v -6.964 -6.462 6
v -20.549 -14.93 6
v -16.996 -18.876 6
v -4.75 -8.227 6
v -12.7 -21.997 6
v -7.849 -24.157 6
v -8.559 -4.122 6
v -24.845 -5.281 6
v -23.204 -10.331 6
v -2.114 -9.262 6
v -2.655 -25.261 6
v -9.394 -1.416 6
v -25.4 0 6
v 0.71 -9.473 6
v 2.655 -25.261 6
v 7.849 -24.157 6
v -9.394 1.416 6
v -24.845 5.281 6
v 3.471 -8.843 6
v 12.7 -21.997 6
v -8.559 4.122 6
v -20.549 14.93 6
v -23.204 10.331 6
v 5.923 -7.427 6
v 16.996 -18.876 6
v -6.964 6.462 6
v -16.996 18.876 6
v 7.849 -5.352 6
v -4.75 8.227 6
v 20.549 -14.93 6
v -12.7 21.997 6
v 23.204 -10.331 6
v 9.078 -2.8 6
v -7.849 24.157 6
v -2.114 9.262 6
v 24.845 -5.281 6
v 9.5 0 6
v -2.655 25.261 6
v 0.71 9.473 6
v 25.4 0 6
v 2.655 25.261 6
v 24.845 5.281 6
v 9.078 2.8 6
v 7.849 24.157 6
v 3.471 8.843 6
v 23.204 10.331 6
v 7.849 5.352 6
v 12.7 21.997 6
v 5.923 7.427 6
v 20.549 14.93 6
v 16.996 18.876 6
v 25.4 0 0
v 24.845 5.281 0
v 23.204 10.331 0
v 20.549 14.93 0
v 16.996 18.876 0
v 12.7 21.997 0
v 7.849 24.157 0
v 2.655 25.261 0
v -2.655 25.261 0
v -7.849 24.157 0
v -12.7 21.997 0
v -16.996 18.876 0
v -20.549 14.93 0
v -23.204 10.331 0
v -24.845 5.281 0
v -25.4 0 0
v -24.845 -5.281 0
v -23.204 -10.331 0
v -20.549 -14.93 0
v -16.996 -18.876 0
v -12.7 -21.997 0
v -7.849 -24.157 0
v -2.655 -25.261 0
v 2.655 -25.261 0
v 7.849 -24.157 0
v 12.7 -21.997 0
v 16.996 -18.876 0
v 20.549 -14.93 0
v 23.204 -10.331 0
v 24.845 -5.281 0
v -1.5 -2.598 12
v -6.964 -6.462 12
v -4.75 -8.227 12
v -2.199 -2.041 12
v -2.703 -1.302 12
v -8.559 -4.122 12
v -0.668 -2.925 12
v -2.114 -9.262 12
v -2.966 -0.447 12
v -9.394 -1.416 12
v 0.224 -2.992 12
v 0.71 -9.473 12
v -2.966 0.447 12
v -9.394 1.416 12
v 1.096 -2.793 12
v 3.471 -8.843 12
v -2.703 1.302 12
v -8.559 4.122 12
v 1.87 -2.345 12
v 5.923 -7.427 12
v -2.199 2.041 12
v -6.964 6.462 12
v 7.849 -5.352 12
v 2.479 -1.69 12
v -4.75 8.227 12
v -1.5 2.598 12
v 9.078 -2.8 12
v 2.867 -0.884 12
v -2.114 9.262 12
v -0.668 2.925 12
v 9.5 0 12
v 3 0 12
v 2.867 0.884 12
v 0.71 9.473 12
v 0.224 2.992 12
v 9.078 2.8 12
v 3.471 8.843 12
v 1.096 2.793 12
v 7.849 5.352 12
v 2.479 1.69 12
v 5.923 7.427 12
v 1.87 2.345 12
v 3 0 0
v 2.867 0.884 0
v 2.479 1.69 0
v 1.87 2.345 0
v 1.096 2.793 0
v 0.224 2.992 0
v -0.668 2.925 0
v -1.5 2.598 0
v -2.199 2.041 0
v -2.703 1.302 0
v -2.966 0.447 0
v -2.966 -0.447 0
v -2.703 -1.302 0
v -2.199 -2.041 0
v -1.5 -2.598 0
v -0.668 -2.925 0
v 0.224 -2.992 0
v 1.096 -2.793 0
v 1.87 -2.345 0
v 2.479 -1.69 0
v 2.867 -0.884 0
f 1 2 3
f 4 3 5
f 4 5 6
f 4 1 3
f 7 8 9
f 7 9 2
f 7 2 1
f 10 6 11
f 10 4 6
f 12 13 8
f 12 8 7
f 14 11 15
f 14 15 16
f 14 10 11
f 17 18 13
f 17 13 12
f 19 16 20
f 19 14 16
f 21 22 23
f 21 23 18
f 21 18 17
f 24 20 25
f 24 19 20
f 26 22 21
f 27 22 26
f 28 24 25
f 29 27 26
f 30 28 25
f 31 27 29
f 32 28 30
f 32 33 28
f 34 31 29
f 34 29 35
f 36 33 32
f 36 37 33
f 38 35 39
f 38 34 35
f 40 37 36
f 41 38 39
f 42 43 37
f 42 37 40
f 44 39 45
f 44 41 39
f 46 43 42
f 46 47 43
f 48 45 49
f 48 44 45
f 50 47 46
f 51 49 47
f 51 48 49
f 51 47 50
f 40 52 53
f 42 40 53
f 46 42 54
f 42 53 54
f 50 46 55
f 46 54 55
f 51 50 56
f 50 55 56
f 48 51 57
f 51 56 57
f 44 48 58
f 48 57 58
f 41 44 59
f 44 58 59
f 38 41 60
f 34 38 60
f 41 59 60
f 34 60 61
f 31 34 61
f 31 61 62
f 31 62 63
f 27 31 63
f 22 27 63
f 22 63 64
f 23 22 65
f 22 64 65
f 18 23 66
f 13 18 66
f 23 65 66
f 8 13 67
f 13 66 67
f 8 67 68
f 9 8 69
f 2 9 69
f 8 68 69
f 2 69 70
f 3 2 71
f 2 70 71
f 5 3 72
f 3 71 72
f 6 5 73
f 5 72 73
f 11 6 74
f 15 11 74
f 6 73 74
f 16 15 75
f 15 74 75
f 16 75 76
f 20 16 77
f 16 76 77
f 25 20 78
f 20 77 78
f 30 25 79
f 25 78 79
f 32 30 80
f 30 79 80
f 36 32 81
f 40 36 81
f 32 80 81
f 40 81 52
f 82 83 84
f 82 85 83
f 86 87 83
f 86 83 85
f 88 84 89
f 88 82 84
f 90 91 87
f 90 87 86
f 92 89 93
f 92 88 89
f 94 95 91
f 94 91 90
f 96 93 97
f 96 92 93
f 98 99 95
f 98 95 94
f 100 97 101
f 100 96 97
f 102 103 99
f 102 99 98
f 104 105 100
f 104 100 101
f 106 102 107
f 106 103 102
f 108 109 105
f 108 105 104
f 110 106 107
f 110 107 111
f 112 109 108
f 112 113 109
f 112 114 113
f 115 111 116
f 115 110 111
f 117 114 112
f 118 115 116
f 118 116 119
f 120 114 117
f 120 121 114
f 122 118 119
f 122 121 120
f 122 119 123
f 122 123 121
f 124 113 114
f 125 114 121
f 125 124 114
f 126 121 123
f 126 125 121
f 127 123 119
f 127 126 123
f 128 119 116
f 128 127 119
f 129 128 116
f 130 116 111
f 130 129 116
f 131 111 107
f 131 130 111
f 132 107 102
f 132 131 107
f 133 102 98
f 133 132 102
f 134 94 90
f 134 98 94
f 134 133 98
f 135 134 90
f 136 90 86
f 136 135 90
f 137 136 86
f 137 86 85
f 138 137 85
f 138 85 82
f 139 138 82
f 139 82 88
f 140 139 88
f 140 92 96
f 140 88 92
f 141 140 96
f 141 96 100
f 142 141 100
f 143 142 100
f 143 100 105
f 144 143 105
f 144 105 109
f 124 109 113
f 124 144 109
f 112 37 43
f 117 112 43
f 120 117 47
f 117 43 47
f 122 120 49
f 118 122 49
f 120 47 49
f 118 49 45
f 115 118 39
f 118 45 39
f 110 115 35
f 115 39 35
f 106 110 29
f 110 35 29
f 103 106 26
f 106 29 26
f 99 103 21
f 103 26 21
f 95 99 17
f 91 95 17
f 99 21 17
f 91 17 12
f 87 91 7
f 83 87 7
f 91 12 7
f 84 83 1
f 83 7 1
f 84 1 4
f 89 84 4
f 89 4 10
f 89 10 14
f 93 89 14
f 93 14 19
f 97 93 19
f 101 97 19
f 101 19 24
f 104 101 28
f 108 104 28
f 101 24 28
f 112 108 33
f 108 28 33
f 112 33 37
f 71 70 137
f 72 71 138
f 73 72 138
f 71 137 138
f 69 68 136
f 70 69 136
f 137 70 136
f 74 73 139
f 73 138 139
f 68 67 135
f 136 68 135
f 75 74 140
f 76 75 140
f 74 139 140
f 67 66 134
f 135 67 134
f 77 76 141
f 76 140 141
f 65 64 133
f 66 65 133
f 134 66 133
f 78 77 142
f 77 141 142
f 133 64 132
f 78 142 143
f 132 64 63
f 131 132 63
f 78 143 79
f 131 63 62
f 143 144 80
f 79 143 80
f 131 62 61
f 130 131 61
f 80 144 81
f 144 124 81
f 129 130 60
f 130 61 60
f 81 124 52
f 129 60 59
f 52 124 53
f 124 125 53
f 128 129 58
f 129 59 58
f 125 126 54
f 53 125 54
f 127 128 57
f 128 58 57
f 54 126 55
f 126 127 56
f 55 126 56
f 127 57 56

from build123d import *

# Parameters (mm, degrees)
SKETCH1_R           = 25.4
BOSS_EXTRUDE1_DEPTH = 6
SKETCH4_R           = 9.5
BOSS_EXTRUDE2_DEPTH = 6
CUT_EXTRUDE1_REACH  = 39.872
SKETCH6_R           = 3


with BuildPart() as part:
    # Sketch1 → Boss-Extrude1 (new body)
    with BuildSketch(Plane.XY):
        Circle(SKETCH1_R)
    extrude(amount=BOSS_EXTRUDE1_DEPTH)

    # Sketch4 → Boss-Extrude2 (add)
    with BuildSketch(Plane.XY.offset(6)):
        Circle(SKETCH4_R)
    extrude(amount=BOSS_EXTRUDE2_DEPTH)

    # Sketch6 → Cut-Extrude1 (cut, up to next)
    with BuildSketch(Plane.XY, mode=Mode.PRIVATE) as cut_extrude1_sk1:
        Circle(SKETCH6_R)
    cut_extrude1_tool1 = extrude(cut_extrude1_sk1.sketch, amount=CUT_EXTRUDE1_REACH, mode=Mode.PRIVATE) & part.part
    add(cut_extrude1_tool1.solids().sort_by_distance((0, 0, 0))[0], mode=Mode.SUBTRACT)


solid = part.part
